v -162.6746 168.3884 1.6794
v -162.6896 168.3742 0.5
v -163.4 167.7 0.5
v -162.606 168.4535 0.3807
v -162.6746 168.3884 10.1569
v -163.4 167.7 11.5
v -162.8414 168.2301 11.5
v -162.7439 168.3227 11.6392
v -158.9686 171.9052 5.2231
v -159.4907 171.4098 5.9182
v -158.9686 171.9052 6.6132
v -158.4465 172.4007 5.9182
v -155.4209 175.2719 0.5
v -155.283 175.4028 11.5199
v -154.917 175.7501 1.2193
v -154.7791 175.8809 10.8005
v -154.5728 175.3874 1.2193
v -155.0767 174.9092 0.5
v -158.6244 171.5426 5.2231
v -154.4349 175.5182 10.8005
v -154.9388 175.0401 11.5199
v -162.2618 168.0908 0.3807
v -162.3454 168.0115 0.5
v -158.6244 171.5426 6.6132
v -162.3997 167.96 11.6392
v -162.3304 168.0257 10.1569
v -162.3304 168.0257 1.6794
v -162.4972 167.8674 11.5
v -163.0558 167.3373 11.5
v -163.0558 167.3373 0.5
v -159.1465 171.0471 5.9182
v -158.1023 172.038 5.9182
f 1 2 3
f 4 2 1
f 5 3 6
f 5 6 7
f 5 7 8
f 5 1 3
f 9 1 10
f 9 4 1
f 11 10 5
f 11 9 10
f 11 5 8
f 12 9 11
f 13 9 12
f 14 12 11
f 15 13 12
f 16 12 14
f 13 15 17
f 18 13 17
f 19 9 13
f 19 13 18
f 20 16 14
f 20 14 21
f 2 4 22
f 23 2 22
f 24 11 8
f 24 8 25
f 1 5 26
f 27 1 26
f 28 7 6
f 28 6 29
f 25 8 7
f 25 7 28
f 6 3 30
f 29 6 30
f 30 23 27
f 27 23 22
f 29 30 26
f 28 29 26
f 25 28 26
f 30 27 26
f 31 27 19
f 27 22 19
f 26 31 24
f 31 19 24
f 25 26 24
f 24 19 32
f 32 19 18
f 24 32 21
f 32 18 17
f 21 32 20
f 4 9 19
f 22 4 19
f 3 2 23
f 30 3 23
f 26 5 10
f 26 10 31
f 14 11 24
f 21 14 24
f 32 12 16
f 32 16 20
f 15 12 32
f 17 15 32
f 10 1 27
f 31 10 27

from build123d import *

# Parameters (mm, degrees)
BOX244_W                  = 0.5
BOX244_H                  = 1
BOX244_DEPTH              = 15
BOX244_ROLL_ANGLE         = 46
BOX245_W                  = 0.5
BOX245_H                  = 1
BOX245_DEPTH              = 15
BOX245_ROLL_ANGLE         = -46
BOX243_W                  = 0.5
BOX243_H                  = 1
BOX243_DEPTH              = 11
FUSION024_PLACEMENT_ANGLE = 46.5


with BuildPart() as cubo244:
    # Box244 → Box244 (new body)
    with BuildSketch(Plane.XY):
        with Locations((0.25, 0.5)):
            Rectangle(BOX244_W, BOX244_H)
    extrude(amount=BOX244_DEPTH)


with BuildPart() as cubo244_1:
    # Box244 roll: moved
    add(cubo244.part.rotate(Axis((0, 0, 0), (1, 0, 0)), BOX244_ROLL_ANGLE))


with BuildPart() as cubo244_2:
    # Box244 placement: moved
    add(cubo244_1.part.moved(Location((0, 11, 0.5))))


with BuildPart() as cubo245:
    # Box245 → Box245 (new body)
    with BuildSketch(Plane.XY):
        with Locations((0.25, 0.5)):
            Rectangle(BOX245_W, BOX245_H)
    extrude(amount=BOX245_DEPTH)


with BuildPart() as cubo245_1:
    # Box245 roll: moved
    add(cubo245.part.rotate(Axis((0, 0, 0), (1, 0, 0)), BOX245_ROLL_ANGLE))


with BuildPart() as cubo245_2:
    # Box245 placement: moved
    add(cubo245_1.part.moved(Location((0, 0.4, 1.1))))


with BuildPart() as fusion024:
    # Box243 → Box243 (new body)
    with BuildSketch(Plane.XY.offset(0.5)):
        with Locations((0.25, 0.5)):
            Rectangle(BOX243_W, BOX243_H)
    extrude(amount=BOX243_DEPTH)

    # Fusion024: union Cubo244, Cubo245
    add(cubo244_2.part)
    add(cubo245_2.part)


with BuildPart() as fusion024_1:
    # Fusion024 placement: moved
    add(fusion024.part.moved(Location((-163.4, 167.7, 0))).rotate(Axis((-163.4, 167.7, 0), (0, 0, -1)), FUSION024_PLACEMENT_ANGLE))


solid = fusion024_1.part
